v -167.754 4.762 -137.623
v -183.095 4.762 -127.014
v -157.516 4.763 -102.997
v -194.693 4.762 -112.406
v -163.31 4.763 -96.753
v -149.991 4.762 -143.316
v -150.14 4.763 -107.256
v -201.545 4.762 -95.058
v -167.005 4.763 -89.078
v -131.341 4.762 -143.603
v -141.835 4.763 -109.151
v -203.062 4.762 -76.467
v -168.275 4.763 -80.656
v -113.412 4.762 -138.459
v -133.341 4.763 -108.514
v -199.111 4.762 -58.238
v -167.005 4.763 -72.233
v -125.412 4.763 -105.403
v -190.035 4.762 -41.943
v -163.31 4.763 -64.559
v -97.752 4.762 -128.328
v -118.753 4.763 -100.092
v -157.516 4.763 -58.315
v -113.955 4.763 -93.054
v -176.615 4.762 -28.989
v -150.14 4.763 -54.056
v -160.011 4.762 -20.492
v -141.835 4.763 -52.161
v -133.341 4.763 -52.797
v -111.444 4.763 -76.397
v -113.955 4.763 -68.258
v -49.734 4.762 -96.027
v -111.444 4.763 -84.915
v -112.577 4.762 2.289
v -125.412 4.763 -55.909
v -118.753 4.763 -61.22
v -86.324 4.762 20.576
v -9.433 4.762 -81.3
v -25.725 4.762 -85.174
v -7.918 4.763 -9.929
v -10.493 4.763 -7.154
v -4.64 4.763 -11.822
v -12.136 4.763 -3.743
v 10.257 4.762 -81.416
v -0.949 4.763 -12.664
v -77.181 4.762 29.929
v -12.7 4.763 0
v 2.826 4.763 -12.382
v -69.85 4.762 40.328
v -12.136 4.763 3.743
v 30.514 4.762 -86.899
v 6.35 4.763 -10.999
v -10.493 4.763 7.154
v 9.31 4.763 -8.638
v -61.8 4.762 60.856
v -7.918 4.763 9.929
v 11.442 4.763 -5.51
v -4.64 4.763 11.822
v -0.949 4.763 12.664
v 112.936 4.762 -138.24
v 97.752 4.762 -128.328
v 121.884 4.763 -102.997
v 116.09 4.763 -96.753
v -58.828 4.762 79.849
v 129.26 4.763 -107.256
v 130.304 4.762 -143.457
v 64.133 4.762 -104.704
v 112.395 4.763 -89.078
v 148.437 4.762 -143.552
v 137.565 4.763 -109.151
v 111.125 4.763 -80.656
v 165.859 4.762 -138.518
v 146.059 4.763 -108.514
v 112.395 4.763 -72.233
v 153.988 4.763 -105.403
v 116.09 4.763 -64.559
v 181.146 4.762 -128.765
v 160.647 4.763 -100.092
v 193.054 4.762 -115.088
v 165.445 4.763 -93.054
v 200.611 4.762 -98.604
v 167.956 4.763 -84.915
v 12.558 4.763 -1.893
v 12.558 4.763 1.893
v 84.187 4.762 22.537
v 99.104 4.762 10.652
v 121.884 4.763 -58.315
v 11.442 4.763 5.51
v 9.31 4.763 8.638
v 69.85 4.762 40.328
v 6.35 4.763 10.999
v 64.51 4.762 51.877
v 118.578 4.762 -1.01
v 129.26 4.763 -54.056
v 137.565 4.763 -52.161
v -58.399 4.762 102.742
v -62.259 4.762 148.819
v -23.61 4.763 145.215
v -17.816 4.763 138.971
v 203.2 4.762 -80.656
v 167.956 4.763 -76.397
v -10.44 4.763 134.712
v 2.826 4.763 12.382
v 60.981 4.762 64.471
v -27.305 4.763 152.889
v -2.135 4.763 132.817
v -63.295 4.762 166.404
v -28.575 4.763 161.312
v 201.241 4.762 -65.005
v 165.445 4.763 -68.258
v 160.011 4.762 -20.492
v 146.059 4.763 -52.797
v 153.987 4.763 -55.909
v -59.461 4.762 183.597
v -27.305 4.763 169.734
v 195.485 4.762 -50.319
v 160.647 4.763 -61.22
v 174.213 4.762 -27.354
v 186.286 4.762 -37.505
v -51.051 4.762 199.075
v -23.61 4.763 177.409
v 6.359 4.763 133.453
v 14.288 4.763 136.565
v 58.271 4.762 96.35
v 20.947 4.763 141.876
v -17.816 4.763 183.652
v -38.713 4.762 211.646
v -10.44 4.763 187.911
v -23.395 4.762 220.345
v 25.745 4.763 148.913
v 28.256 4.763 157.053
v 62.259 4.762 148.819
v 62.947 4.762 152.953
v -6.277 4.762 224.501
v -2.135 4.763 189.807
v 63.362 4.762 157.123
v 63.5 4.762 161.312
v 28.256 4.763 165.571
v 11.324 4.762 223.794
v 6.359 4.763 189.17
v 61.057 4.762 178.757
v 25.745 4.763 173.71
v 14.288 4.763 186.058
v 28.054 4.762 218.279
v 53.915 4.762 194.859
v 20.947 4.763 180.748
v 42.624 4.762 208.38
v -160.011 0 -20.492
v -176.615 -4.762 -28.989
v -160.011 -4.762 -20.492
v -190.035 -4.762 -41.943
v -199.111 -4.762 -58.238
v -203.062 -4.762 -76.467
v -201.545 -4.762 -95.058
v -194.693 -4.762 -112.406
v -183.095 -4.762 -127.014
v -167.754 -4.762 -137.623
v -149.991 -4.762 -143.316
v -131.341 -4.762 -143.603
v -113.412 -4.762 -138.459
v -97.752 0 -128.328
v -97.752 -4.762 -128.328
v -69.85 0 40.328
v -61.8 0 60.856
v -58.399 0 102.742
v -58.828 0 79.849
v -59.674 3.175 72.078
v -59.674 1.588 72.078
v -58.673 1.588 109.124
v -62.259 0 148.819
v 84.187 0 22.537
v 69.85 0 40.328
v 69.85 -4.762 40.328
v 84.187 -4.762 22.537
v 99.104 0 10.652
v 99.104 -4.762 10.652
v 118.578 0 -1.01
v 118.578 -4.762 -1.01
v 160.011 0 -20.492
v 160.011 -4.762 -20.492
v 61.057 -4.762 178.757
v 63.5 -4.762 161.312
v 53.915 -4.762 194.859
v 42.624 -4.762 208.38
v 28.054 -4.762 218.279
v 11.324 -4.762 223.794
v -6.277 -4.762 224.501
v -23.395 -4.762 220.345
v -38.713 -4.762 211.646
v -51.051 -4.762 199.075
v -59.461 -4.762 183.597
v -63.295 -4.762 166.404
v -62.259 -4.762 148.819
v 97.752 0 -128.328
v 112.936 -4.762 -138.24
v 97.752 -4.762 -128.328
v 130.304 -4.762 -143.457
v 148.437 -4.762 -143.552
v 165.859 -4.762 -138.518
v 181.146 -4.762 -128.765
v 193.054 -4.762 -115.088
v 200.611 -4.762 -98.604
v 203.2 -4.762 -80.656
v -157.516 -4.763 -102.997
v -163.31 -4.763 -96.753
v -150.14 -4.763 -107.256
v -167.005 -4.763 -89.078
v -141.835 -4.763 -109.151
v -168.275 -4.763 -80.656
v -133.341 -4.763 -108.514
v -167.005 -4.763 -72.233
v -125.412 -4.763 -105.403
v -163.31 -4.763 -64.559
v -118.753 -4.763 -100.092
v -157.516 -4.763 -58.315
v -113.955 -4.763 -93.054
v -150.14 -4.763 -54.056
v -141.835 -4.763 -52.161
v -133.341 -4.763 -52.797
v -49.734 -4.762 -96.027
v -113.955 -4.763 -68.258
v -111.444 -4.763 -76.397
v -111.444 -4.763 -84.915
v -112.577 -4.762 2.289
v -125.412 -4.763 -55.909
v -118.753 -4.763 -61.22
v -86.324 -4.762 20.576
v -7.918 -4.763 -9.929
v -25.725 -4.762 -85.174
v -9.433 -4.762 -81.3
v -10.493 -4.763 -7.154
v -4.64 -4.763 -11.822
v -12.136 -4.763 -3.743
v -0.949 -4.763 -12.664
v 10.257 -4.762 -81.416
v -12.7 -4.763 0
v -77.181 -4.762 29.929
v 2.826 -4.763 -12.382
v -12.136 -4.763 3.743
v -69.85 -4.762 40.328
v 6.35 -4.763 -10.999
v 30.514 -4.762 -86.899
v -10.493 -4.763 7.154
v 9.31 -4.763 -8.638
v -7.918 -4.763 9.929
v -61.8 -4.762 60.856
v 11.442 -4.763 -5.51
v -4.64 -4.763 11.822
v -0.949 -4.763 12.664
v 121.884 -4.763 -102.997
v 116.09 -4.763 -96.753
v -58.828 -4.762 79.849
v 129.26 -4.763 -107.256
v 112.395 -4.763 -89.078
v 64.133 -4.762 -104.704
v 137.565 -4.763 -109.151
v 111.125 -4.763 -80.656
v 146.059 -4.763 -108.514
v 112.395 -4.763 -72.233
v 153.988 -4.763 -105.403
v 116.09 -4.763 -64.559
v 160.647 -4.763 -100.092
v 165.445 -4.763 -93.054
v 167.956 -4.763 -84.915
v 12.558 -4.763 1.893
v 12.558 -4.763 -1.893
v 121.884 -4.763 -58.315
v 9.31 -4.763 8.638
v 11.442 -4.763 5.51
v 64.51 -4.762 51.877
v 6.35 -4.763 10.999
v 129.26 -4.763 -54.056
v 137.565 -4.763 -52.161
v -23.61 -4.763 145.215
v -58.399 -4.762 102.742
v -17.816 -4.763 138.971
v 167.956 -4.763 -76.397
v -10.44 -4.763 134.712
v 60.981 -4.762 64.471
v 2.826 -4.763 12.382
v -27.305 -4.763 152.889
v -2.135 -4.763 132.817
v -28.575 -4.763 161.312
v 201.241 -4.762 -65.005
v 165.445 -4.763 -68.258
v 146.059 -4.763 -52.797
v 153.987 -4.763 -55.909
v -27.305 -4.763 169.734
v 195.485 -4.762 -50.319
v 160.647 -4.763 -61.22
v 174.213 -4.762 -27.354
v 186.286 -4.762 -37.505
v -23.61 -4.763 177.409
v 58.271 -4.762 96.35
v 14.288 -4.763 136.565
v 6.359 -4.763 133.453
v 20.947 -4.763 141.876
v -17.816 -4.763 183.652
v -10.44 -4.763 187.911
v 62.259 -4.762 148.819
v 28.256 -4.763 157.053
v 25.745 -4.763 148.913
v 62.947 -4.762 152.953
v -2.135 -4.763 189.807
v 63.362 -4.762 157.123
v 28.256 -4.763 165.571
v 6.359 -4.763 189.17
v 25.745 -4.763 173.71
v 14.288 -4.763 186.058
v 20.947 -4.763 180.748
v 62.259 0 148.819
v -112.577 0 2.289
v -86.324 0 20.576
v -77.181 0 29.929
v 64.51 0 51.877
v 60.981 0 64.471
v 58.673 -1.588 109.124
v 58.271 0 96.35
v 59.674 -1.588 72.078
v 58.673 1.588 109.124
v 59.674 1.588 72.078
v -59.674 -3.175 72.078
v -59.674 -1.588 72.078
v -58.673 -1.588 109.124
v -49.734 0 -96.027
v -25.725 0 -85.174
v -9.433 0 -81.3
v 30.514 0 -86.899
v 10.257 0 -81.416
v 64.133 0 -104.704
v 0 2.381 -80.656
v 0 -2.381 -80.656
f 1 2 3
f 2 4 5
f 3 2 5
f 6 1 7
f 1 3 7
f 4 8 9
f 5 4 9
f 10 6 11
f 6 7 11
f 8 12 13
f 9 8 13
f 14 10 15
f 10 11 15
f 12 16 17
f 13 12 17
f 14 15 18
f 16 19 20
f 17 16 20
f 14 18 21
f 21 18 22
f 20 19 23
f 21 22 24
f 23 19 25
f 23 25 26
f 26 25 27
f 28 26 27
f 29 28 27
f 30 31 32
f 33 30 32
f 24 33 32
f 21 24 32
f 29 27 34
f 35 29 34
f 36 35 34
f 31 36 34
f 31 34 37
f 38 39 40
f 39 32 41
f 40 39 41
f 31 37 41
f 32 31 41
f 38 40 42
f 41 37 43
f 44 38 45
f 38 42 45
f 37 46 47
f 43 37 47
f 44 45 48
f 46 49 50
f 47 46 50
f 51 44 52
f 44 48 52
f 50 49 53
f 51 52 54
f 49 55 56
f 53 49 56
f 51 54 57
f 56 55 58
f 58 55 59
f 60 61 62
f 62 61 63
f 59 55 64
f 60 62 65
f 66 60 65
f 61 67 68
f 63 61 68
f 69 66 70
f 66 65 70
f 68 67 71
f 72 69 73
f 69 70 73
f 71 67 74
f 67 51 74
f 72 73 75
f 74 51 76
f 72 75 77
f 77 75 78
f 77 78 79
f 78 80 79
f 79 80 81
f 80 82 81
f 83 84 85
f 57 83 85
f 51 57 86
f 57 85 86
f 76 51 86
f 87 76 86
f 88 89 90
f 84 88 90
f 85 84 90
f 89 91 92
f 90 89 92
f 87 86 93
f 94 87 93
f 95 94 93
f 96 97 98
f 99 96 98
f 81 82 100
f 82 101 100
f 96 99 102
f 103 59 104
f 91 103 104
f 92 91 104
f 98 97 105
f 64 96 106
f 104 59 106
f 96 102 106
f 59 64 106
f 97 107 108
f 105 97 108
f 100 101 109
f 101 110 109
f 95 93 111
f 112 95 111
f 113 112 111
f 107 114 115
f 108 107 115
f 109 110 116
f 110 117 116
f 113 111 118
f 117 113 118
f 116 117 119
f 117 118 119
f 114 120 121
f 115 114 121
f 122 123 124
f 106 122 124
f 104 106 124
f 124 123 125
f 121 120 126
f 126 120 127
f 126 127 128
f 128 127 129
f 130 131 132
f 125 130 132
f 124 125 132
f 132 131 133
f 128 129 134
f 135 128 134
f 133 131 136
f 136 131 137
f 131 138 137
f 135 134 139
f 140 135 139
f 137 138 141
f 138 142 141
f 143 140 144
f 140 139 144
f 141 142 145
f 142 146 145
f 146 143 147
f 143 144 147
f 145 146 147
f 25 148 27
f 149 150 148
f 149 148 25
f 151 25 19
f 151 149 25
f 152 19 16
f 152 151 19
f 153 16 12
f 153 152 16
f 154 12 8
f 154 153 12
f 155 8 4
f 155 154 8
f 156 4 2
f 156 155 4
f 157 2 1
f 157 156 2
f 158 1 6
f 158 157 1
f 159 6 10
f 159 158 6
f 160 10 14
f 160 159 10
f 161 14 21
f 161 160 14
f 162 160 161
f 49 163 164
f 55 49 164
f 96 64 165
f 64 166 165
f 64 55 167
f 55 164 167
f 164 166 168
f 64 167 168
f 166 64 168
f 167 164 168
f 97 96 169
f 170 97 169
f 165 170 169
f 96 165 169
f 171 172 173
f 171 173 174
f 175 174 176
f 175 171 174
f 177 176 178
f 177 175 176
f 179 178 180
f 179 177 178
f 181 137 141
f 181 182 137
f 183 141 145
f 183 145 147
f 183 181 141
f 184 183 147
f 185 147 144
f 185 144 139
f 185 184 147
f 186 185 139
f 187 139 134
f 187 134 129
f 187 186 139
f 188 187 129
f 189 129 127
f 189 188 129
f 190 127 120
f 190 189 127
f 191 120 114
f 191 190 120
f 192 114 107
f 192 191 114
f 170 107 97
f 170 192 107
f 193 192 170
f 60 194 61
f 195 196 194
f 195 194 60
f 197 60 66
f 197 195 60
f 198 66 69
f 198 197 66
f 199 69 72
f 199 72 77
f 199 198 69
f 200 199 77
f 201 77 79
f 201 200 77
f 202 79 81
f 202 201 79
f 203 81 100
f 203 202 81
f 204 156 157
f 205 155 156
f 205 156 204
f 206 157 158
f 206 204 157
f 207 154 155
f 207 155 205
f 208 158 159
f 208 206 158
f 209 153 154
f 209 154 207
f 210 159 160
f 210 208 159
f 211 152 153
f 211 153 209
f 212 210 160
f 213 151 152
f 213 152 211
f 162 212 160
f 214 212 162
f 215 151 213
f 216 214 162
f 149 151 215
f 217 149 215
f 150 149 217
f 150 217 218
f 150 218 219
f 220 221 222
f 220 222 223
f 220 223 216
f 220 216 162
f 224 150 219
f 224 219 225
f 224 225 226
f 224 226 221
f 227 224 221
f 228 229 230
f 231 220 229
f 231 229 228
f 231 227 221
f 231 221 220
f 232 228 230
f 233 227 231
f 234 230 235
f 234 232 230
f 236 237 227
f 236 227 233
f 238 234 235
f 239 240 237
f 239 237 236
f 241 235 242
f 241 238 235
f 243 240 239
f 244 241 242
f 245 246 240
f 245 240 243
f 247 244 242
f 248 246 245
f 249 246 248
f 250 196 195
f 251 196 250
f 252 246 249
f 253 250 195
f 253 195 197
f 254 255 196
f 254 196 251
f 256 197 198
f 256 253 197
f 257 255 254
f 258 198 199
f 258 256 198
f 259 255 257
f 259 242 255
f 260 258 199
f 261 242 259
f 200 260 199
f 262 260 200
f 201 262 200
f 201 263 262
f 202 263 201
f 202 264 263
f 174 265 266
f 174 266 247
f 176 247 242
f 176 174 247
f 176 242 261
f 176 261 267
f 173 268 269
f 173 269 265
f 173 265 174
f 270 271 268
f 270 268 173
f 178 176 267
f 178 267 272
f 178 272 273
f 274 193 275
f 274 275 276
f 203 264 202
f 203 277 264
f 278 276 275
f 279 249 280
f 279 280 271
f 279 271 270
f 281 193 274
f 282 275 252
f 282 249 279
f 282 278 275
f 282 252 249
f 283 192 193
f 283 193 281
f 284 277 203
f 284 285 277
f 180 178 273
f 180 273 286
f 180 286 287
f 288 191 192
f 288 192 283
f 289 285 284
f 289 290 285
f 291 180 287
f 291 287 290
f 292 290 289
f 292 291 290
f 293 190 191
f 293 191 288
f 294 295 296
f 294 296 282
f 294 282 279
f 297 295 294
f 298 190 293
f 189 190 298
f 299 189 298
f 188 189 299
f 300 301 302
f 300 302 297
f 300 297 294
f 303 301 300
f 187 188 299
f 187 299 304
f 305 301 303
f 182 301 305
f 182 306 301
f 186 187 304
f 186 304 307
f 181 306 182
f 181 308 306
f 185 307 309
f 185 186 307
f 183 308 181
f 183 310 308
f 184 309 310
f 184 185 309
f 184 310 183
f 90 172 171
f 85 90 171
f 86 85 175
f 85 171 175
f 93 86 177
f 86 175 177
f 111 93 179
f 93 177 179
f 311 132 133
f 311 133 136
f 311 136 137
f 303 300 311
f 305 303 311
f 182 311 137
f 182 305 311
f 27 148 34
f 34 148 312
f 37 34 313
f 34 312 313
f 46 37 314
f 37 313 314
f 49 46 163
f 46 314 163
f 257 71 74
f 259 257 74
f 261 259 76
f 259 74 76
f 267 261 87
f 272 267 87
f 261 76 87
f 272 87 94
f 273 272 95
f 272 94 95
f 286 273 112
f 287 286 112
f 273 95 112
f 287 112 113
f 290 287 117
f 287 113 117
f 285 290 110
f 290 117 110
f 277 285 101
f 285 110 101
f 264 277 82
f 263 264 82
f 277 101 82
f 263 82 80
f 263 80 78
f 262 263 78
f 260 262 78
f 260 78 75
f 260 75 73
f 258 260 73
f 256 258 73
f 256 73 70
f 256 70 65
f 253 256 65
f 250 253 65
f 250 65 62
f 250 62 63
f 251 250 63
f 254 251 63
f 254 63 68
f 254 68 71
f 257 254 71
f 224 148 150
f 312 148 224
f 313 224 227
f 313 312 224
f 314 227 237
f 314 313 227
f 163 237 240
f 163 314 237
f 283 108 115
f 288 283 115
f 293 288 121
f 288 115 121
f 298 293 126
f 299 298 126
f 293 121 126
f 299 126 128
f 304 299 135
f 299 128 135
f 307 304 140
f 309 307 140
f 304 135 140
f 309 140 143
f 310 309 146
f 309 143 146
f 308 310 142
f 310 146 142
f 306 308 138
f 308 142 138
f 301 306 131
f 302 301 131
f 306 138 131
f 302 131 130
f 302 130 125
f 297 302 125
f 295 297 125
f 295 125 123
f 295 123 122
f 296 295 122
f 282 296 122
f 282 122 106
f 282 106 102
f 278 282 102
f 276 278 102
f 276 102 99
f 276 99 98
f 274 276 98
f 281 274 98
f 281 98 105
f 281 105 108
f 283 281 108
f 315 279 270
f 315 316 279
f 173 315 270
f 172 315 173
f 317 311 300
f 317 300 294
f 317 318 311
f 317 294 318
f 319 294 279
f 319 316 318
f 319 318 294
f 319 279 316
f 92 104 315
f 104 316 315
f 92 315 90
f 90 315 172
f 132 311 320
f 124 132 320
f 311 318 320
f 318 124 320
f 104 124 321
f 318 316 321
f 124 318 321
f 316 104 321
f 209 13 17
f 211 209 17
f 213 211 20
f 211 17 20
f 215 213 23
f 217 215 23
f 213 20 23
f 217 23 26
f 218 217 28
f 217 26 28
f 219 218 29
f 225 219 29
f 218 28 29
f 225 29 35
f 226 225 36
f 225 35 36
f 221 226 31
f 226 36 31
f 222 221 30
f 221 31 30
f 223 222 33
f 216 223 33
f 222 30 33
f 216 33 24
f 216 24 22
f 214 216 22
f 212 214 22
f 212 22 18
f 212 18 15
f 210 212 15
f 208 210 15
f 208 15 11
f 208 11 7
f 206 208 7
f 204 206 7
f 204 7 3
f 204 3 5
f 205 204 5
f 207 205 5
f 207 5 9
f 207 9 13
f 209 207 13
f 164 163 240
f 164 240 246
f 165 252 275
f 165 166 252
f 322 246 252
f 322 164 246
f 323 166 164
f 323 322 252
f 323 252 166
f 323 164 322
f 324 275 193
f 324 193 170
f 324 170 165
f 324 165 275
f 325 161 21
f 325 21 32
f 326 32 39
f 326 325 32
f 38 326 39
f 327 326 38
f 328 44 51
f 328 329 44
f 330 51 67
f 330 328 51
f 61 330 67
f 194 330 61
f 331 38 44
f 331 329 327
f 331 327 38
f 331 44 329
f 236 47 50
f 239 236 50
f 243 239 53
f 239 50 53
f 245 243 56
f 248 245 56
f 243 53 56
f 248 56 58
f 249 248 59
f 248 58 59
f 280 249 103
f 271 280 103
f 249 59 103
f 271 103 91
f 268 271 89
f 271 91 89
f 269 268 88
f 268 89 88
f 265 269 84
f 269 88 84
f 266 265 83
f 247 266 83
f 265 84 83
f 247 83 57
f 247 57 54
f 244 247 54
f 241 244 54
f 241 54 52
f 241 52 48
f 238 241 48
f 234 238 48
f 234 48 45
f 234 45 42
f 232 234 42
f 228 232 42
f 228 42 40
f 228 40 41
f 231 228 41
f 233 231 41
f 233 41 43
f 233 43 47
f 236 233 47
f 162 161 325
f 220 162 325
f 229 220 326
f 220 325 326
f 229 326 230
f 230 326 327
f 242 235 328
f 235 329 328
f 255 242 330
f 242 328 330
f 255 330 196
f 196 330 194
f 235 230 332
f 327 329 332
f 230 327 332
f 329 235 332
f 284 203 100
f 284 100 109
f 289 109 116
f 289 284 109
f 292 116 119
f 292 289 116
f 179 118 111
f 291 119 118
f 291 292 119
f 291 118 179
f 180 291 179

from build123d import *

# Parameters (mm, degrees)
F1_DEPTH = 4.7625
F3_D     = 57.15
F4_D     = 25.4


with BuildPart() as f1:
    # F0 (on Front) → F1 (new body, symmetric)
    with BuildSketch(Plane.XZ):
        with BuildLine():
            ThreePointArc((63.5, 161.311665), (-6.276947, 224.500667), (-62.259053, 148.819256))
            ThreePointArc((-62.259053, 148.819256), (0, 161.317577), (62.259053, 148.819256))
            ThreePointArc((62.259053, 148.819256), (63.189002, 155.034718), (63.5, 161.311665))
        make_face()
        with BuildLine():
            ThreePointArc((-62.259053, 148.819256), (-51.584807, 124.281169), (-31.75, 106.319052))
            Line((-31.75, 106.319052), (0, 161.311665))
            Line((0, 161.311665), (31.75, 106.319052))
            ThreePointArc((31.75, 106.319052), (51.584807, 124.281169), (62.259053, 148.819256))
            ThreePointArc((62.259053, 148.819256), (0, 161.317577), (-62.259053, 148.819256))
        make_face()
        with BuildLine():
            ThreePointArc((-107.95, -25.663219), (-84.707387, -48.905833), (-76.2, -80.655833))
            Line((-76.2, -80.655833), (0, -80.655833))
            Line((0, -80.655833), (76.2, -80.655833))
            ThreePointArc((76.2, -80.655833), (84.707387, -48.905833), (107.95, -25.663219))
            Line((107.95, -25.663219), (69.849998, 40.327919))
            Line((69.849998, 40.327919), (31.75, 106.319052))
            ThreePointArc((31.75, 106.319052), (0, 97.811665), (-31.75, 106.319052))
            Line((-31.75, 106.319052), (-69.849998, 40.327919))
            Line((-69.849998, 40.327919), (-107.95, -25.663219))
        make_face()
        with BuildLine():
            Line((69.849998, 40.327919), (107.95, -25.663219))
            ThreePointArc((107.95, -25.663219), (133.423053, -17.466831), (160.010782, -20.491706))
            add(Edge.make_bspline(
                [(69.849998, 40.327919), (69.849999, 40.327918), (86.141954, 12.109423), (123.076369, -4.191142), (160.010782, -20.491706)],
                knots=[108.756574, 108.756574, 108.756574, 108.756574, 108.756578, 217.513155, 217.513155, 217.513155, 217.513155], degree=3))
        make_face()
        with BuildLine():
            ThreePointArc((-160.010782, -20.491706), (-133.423053, -17.466831), (-107.95, -25.663219))
            Line((-107.95, -25.663219), (-69.849998, 40.327919))
            add(Edge.make_bspline(
                [(-160.010782, -20.491706), (-123.076369, -4.191142), (-86.141954, 12.109423), (-69.849999, 40.327918), (-69.849998, 40.327919)],
                knots=[0, 0, 0, 0, 108.756578, 108.756581, 108.756581, 108.756581, 108.756581], degree=3))
        make_face()
        with BuildLine():
            Line((0, 161.311665), (-31.75, 106.319052))
            ThreePointArc((-31.75, 106.319052), (0, 97.811665), (31.75, 106.319052))
            Line((31.75, 106.319052), (0, 161.311665))
        make_face()
        with BuildLine():
            ThreePointArc((160.010782, -20.491706), (139.705119, -80.658788), (97.751729, -128.327549))
            ThreePointArc((97.751729, -128.327549), (165.858505, -138.517587), (203.2, -80.655833))
            ThreePointArc((203.2, -80.655833), (191.284807, -43.625336), (160.010782, -20.491706))
        make_face()
        with BuildLine():
            ThreePointArc((107.95, -25.663219), (84.707387, -48.905833), (76.2, -80.655833))
            Line((76.2, -80.655833), (139.7, -80.655833))
            Line((139.7, -80.655833), (107.95, -25.663219))
        make_face()
        with BuildLine():
            Line((139.7, -80.655833), (76.2, -80.655833))
            ThreePointArc((76.2, -80.655833), (81.838246, -106.814338), (97.751729, -128.327549))
            ThreePointArc((97.751729, -128.327549), (139.705119, -80.658788), (160.010782, -20.491706))
            ThreePointArc((160.010782, -20.491706), (133.423053, -17.466831), (107.95, -25.663219))
            Line((107.95, -25.663219), (139.7, -80.655833))
        make_face()
        with BuildLine():
            Line((31.75, 106.319052), (69.849998, 40.327919))
            add(Edge.make_bspline(
                [(62.259053, 148.819256), (57.908549, 108.682834), (53.558045, 68.546413), (69.849998, 40.327919)],
                knots=[0, 0, 0, 0, 108.756574, 108.756574, 108.756574, 108.756574], degree=3))
            ThreePointArc((62.259053, 148.819256), (51.584807, 124.281169), (31.75, 106.319052))
        make_face()
        with BuildLine():
            Line((0, -80.655833), (-76.2, -80.655833))
            ThreePointArc((-76.2, -80.655833), (-81.838246, -106.814338), (-97.751729, -128.327549))
            add(Edge.make_bspline(
                [(-97.751729, -128.327549), (-65.16782, -104.491691), (-32.58391, -80.655833), (0, -80.655833)],
                knots=[0, 0, 0, 0, 108.756578, 108.756578, 108.756578, 108.756578], degree=3))
        make_face()
        with BuildLine():
            Line((76.2, -80.655833), (0, -80.655833))
            add(Edge.make_bspline(
                [(0, -80.655833), (32.58391, -80.655833), (65.16782, -104.491691), (97.751729, -128.327549)],
                knots=[108.756578, 108.756578, 108.756578, 108.756578, 217.513155, 217.513155, 217.513155, 217.513155], degree=3))
            ThreePointArc((97.751729, -128.327549), (81.838246, -106.814338), (76.2, -80.655833))
        make_face()
        with BuildLine():
            ThreePointArc((-97.751729, -128.327549), (-81.838246, -106.814338), (-76.2, -80.655833))
            Line((-76.2, -80.655833), (-139.7, -80.655833))
            Line((-139.7, -80.655833), (-107.95, -25.663219))
            ThreePointArc((-107.95, -25.663219), (-133.423053, -17.466831), (-160.010782, -20.491706))
            ThreePointArc((-160.010782, -20.491706), (-139.705119, -80.658788), (-97.751729, -128.327549))
        make_face()
        with BuildLine():
            Line((-139.7, -80.655833), (-76.2, -80.655833))
            ThreePointArc((-76.2, -80.655833), (-84.707387, -48.905833), (-107.95, -25.663219))
            Line((-107.95, -25.663219), (-139.7, -80.655833))
        make_face()
        with BuildLine():
            ThreePointArc((-160.010782, -20.491706), (-194.692613, -112.405833), (-97.751729, -128.327549))
            ThreePointArc((-97.751729, -128.327549), (-139.705119, -80.658788), (-160.010782, -20.491706))
        make_face()
        with BuildLine():
            add(Edge.make_bspline(
                [(-69.849998, 40.327919), (-53.558045, 68.546413), (-57.908549, 108.682834), (-62.259053, 148.819256)],
                knots=[108.756581, 108.756581, 108.756581, 108.756581, 217.513155, 217.513155, 217.513155, 217.513155], degree=3))
            Line((-69.849998, 40.327919), (-31.75, 106.319052))
            ThreePointArc((-31.75, 106.319052), (-51.584807, 124.281169), (-62.259053, 148.819256))
        make_face()
    extrude(amount=F1_DEPTH, both=True)

    # F3 (through all)
    with Locations(Plane.XZ.offset(4.7625)):
        with Locations((-139.7, -80.655833), (139.7, -80.655833), (0, 161.311665)):
            Hole(F3_D / 2)

    # F4 (through all)
    with Locations(Plane.XZ.offset(4.7625)):
        with Locations((0, 0)):
            Hole(F4_D / 2)


solid = f1.part
